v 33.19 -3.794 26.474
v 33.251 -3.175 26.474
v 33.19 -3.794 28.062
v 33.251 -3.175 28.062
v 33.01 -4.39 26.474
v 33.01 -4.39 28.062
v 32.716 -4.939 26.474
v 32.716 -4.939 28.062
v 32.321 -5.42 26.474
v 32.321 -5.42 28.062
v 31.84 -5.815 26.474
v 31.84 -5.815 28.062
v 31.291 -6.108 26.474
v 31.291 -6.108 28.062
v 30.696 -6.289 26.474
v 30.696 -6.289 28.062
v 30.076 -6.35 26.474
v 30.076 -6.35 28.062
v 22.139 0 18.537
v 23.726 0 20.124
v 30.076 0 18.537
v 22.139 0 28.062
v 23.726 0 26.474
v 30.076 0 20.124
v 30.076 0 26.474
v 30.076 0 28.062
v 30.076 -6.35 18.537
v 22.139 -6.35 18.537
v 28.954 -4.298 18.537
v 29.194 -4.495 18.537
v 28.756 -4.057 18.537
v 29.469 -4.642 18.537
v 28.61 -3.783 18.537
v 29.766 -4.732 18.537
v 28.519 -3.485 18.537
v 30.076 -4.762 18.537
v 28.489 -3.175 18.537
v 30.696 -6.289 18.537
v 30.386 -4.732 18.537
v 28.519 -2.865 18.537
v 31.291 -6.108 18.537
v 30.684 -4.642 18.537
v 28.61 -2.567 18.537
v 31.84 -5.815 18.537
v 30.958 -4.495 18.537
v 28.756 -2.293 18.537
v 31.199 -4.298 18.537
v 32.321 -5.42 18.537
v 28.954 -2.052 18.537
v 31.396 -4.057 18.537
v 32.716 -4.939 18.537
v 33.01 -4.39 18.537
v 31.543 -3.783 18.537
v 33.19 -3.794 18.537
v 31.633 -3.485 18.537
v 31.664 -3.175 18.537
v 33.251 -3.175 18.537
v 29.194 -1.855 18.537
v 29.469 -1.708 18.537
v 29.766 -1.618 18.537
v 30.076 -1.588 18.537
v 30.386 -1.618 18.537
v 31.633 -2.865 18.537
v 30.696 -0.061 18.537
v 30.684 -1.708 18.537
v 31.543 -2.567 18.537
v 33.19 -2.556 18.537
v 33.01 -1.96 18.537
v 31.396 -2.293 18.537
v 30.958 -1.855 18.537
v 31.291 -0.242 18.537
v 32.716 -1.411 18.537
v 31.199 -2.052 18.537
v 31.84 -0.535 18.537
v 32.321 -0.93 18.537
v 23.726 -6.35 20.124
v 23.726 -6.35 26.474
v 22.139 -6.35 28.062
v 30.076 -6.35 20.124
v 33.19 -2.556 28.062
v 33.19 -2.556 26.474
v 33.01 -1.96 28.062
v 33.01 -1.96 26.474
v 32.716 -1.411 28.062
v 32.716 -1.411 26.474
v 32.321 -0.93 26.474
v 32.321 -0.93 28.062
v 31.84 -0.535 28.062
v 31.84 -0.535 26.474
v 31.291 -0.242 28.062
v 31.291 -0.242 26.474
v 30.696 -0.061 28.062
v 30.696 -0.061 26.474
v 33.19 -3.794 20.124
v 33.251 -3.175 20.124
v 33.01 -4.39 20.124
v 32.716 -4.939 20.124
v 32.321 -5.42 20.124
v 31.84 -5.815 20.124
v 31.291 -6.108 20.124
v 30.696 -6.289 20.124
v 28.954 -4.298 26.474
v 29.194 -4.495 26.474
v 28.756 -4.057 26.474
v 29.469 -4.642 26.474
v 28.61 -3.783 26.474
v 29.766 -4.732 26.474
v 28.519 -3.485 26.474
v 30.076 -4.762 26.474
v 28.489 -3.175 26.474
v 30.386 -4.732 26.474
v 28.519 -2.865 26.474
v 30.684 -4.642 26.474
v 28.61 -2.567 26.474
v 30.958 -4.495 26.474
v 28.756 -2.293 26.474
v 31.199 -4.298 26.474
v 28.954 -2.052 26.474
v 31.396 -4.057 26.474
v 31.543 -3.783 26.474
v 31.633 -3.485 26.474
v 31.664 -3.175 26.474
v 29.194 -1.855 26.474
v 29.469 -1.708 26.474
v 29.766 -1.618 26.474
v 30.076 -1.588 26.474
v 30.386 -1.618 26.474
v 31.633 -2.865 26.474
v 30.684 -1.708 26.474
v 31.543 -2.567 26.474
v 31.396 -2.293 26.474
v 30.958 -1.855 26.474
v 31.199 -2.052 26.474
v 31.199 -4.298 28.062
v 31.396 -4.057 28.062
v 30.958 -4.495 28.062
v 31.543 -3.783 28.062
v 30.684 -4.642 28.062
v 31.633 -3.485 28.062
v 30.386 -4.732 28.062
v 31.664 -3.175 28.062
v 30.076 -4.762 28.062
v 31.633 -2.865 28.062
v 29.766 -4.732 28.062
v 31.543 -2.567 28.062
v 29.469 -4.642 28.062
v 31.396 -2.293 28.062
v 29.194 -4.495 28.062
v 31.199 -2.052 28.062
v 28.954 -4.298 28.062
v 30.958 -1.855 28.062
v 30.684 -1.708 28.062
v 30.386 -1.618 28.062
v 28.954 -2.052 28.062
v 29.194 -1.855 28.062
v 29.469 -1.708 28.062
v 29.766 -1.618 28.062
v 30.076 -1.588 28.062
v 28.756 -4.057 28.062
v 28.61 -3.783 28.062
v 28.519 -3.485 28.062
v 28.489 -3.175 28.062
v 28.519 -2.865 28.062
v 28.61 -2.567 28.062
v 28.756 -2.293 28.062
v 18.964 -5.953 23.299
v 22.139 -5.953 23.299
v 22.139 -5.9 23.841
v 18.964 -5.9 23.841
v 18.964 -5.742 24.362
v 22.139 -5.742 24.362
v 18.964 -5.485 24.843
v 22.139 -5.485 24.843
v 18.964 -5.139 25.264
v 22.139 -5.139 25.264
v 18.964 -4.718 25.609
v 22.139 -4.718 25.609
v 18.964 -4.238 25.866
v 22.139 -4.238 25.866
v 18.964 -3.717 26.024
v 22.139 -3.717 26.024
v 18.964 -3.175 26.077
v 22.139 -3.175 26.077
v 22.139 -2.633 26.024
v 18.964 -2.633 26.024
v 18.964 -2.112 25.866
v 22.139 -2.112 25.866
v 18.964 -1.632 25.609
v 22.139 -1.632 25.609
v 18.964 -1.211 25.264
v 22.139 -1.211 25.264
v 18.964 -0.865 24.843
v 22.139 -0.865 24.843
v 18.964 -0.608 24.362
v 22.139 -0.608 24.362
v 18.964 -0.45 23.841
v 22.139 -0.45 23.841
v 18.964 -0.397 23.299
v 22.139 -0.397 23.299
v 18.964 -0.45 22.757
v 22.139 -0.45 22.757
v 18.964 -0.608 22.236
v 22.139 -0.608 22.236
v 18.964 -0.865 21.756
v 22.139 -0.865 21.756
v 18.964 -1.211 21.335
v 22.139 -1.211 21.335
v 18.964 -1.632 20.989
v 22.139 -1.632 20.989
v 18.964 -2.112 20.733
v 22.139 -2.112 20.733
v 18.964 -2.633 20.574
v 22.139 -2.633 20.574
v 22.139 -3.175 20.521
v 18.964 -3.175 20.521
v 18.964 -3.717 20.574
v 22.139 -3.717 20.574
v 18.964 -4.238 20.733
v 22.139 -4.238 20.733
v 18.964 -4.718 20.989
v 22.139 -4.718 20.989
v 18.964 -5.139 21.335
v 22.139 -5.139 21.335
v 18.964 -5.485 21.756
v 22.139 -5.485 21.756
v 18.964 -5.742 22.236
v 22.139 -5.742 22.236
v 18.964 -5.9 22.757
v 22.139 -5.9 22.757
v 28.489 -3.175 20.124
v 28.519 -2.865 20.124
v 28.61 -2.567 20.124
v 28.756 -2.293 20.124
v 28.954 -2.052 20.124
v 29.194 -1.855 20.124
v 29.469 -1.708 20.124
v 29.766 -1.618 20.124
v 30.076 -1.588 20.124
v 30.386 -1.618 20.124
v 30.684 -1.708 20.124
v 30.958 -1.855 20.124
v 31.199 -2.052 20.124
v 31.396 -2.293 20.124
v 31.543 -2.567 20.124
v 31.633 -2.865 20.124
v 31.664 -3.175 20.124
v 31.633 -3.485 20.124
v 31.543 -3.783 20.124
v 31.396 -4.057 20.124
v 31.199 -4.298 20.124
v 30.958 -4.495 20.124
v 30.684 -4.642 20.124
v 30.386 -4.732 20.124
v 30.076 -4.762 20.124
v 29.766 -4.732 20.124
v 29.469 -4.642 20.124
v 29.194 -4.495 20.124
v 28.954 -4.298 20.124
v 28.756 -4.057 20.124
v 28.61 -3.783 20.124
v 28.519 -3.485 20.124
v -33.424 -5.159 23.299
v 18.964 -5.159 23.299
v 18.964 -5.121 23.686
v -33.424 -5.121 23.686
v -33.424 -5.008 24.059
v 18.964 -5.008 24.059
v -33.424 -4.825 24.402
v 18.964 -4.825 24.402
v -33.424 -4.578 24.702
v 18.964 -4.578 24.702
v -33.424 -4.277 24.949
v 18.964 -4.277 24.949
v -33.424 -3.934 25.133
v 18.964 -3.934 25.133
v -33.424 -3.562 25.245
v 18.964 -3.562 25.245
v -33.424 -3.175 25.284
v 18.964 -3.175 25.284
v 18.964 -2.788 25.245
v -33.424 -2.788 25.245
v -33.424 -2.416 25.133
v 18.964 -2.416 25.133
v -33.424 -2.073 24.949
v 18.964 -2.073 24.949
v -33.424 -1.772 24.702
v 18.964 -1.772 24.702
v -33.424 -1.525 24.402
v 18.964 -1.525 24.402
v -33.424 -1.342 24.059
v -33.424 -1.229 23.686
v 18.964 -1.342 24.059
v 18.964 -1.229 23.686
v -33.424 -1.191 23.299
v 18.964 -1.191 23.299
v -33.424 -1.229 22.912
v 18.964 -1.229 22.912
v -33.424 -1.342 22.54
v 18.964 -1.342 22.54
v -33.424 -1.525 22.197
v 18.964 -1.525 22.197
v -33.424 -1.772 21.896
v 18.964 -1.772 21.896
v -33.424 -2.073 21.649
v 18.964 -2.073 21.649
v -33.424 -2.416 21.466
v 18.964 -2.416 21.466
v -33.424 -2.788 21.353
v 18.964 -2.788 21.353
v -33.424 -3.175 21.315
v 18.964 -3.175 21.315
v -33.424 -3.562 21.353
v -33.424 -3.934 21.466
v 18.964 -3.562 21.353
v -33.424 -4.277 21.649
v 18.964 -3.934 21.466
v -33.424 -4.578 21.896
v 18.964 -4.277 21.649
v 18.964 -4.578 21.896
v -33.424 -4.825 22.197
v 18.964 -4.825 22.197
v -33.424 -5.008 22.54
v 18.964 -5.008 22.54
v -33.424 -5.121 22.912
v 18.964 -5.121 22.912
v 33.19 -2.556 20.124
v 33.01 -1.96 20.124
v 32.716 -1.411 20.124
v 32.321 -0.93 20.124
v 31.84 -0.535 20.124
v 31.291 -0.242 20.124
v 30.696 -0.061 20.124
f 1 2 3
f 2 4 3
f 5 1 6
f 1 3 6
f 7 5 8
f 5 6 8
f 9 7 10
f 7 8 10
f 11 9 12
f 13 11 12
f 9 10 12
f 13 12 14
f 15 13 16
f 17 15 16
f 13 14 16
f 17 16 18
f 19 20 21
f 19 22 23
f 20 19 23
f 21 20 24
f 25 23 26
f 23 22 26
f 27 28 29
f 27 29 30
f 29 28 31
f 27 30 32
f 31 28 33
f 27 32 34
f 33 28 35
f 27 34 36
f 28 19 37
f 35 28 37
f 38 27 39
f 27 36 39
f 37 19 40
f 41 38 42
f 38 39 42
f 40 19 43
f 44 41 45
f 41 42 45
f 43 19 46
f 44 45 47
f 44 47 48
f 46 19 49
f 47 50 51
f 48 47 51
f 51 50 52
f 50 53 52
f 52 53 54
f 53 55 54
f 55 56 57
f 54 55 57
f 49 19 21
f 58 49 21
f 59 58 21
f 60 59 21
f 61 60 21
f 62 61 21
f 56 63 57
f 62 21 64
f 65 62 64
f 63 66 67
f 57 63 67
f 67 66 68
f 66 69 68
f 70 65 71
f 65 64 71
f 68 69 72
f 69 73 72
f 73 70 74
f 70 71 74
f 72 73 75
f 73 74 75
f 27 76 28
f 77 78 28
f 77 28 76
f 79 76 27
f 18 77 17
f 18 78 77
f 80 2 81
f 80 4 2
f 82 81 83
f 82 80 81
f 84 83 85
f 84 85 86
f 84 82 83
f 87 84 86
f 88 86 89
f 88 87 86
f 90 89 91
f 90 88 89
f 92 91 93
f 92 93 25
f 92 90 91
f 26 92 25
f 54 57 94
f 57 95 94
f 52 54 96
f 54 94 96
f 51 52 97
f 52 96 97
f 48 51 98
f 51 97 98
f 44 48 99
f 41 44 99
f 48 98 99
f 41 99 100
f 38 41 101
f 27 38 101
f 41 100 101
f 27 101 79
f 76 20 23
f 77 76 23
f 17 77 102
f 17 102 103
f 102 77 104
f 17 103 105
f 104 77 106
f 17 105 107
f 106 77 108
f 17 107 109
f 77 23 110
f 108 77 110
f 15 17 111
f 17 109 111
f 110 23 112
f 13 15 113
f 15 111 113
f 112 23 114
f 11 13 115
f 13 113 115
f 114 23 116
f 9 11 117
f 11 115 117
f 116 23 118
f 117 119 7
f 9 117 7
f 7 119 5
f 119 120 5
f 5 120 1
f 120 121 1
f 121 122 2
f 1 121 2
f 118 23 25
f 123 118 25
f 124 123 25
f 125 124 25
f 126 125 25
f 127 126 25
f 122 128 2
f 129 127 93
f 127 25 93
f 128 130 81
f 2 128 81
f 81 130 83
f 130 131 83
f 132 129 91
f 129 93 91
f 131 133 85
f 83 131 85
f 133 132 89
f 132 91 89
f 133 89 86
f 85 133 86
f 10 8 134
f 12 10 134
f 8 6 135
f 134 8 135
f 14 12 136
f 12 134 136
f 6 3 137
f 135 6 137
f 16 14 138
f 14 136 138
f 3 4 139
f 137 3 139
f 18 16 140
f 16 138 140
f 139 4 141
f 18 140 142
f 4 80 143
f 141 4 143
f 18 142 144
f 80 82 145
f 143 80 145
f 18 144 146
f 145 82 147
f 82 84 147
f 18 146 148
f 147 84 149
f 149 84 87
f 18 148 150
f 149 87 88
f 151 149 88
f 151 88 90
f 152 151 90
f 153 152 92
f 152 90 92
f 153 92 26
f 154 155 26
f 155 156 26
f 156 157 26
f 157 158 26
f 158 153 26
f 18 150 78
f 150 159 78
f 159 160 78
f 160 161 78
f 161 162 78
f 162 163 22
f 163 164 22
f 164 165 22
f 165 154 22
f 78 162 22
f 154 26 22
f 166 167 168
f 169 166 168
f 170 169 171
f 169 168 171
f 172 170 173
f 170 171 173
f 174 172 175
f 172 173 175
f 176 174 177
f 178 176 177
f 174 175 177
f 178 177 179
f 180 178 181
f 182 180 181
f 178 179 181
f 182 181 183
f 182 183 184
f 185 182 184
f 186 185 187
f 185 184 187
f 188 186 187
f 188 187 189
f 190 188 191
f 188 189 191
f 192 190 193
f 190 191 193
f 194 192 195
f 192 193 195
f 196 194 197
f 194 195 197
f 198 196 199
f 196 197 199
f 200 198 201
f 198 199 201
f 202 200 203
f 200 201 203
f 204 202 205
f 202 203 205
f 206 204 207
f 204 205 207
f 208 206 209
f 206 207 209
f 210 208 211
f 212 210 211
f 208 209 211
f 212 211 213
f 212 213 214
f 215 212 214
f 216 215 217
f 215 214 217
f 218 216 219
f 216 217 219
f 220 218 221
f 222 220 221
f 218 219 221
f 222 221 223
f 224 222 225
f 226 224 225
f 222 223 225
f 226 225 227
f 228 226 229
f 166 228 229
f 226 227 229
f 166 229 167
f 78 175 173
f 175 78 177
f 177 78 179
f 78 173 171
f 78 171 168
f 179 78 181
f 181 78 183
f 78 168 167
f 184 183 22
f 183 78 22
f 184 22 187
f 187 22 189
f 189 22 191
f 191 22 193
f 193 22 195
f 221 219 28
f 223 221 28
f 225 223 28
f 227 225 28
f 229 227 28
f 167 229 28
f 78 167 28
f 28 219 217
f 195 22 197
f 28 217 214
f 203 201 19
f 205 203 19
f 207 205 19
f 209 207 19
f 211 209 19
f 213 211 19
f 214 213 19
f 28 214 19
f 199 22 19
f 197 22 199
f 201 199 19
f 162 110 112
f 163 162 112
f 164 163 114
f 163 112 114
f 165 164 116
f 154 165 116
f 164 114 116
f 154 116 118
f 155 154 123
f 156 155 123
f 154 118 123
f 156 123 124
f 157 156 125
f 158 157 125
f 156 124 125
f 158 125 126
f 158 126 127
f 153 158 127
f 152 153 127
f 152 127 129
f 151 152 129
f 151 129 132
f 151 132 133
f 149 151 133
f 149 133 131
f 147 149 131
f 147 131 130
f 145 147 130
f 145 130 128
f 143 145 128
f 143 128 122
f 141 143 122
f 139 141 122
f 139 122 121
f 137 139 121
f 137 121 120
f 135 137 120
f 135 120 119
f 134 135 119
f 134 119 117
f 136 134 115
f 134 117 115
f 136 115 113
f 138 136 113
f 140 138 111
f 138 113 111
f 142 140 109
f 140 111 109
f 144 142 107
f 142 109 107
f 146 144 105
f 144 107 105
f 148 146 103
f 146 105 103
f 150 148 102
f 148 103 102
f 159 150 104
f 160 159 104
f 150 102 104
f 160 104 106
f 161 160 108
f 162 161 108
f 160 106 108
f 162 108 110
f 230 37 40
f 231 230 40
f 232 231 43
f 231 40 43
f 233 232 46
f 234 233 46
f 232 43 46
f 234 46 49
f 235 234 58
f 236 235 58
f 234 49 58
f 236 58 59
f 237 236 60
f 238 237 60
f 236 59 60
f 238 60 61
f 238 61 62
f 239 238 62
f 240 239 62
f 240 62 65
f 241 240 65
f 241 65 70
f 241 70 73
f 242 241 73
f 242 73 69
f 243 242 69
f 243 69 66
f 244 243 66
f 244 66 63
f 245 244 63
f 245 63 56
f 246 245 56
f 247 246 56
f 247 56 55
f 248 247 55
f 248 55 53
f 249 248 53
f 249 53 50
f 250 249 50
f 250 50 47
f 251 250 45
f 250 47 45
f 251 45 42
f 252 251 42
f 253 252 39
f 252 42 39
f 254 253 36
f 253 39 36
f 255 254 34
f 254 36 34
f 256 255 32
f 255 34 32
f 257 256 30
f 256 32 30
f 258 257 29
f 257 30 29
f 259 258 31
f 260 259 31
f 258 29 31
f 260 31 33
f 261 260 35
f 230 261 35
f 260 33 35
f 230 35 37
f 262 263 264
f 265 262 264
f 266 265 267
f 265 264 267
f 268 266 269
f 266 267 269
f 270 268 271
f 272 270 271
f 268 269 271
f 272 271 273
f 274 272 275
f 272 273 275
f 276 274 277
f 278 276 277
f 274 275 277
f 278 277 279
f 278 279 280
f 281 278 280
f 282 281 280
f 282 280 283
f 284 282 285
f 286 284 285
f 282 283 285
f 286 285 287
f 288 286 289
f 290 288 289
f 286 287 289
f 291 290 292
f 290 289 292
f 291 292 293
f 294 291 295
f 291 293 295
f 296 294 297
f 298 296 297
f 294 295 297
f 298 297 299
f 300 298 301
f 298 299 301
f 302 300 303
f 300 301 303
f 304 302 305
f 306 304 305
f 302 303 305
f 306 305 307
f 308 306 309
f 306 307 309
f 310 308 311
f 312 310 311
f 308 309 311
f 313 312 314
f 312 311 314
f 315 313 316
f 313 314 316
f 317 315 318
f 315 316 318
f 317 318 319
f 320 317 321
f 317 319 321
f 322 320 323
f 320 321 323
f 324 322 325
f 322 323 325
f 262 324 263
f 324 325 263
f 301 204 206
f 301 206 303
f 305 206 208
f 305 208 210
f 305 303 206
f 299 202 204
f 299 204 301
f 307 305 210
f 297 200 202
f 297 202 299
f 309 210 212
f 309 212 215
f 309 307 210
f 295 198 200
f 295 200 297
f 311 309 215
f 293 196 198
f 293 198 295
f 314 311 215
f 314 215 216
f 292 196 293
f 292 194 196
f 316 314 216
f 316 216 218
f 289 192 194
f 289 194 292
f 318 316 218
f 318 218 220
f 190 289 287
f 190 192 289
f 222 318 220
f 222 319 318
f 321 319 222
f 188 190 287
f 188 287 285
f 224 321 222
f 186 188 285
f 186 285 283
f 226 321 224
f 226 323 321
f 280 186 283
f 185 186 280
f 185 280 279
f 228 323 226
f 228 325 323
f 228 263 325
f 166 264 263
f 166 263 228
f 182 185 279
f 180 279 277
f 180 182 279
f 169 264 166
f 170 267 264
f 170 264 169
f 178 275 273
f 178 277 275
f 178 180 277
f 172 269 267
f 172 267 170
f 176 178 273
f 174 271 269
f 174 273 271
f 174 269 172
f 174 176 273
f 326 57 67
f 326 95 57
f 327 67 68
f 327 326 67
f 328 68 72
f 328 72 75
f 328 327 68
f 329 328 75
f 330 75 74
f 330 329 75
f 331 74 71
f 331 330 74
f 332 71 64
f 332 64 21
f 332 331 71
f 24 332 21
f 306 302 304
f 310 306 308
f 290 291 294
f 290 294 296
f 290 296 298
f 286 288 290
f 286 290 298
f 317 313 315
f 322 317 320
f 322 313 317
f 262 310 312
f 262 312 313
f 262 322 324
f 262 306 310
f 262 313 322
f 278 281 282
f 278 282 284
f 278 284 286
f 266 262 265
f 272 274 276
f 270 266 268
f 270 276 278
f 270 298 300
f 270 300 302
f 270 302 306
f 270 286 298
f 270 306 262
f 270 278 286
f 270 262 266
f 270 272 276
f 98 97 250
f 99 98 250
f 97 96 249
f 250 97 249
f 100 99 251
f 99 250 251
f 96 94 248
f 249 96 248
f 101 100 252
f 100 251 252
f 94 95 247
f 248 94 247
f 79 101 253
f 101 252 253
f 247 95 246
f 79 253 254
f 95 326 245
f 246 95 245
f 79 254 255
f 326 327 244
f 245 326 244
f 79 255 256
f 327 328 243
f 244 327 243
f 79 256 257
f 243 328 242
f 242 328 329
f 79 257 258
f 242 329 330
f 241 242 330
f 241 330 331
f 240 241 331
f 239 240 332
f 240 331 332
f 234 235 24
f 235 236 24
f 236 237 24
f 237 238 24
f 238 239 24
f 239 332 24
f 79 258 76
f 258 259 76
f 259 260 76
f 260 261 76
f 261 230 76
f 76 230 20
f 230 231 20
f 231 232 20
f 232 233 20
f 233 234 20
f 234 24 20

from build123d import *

# Parameters (mm, degrees)
F1_DEPTH = 6.35
F2_R     = 3.17499
F4_D     = 3.175
F5_R     = 2.778125
F6_DEPTH = 3.175
F7_R     = 1.984375
F8_DEPTH = 52.3875


# Not quite as in the source:
# - a fillet or chamfer is up to 0.001 mm smaller than in the source, because OpenCascade refuses the exact size


with BuildPart() as f1:
    # F0 (on Front) → F1 (new body)
    with BuildSketch(Plane.XZ):
        Polygon((33.251190576, 26.4741850346), (33.251190576, 28.0616850346), (22.138690576, 28.0616850346), (22.138690576, 18.5366850346), (33.251190576, 18.5366850346), (33.251190576, 20.1241850346), (23.726190576, 20.1241850346), (23.726190576, 26.4741850346), align=None)
    extrude(amount=F1_DEPTH)

    # F2 (radius 3.175 in the source; OpenCascade refuses exactly that, so slightly less here)
    f2_edges = [f1.edges().sort_by_distance(p)[0] for p in [
        (33.251191, -6.35, 19.330435),
        (33.251191, -6.35, 27.267935),
        (33.251191, 0, 27.267935),
        (33.251191, 0, 19.330435),
    ]]
    fillet(f2_edges, radius=F2_R)

    # F4 (through all)
    with Locations(Plane.XY.offset(28.0616850346)):
        with Locations((30.076190576, -3.175)):
            Hole(F4_D / 2)

    # F5 (on face) → F6 (join)
    with BuildSketch(Plane(origin=(22.138690576, 0, 0), x_dir=(0, -1, 0), z_dir=(-1, 0, 0))):
        with Locations((3.175, 23.2991850346)):
            Circle(F5_R)
    extrude(amount=F6_DEPTH)

    # F7 (on face) → F8 (join)
    with BuildSketch(Plane(origin=(18.963690576, 0, 0), x_dir=(0, -1, 0), z_dir=(-1, 0, 0))):
        with Locations((3.175, 23.2991850346)):
            Circle(F7_R)
    extrude(amount=F8_DEPTH)


solid = f1.part
